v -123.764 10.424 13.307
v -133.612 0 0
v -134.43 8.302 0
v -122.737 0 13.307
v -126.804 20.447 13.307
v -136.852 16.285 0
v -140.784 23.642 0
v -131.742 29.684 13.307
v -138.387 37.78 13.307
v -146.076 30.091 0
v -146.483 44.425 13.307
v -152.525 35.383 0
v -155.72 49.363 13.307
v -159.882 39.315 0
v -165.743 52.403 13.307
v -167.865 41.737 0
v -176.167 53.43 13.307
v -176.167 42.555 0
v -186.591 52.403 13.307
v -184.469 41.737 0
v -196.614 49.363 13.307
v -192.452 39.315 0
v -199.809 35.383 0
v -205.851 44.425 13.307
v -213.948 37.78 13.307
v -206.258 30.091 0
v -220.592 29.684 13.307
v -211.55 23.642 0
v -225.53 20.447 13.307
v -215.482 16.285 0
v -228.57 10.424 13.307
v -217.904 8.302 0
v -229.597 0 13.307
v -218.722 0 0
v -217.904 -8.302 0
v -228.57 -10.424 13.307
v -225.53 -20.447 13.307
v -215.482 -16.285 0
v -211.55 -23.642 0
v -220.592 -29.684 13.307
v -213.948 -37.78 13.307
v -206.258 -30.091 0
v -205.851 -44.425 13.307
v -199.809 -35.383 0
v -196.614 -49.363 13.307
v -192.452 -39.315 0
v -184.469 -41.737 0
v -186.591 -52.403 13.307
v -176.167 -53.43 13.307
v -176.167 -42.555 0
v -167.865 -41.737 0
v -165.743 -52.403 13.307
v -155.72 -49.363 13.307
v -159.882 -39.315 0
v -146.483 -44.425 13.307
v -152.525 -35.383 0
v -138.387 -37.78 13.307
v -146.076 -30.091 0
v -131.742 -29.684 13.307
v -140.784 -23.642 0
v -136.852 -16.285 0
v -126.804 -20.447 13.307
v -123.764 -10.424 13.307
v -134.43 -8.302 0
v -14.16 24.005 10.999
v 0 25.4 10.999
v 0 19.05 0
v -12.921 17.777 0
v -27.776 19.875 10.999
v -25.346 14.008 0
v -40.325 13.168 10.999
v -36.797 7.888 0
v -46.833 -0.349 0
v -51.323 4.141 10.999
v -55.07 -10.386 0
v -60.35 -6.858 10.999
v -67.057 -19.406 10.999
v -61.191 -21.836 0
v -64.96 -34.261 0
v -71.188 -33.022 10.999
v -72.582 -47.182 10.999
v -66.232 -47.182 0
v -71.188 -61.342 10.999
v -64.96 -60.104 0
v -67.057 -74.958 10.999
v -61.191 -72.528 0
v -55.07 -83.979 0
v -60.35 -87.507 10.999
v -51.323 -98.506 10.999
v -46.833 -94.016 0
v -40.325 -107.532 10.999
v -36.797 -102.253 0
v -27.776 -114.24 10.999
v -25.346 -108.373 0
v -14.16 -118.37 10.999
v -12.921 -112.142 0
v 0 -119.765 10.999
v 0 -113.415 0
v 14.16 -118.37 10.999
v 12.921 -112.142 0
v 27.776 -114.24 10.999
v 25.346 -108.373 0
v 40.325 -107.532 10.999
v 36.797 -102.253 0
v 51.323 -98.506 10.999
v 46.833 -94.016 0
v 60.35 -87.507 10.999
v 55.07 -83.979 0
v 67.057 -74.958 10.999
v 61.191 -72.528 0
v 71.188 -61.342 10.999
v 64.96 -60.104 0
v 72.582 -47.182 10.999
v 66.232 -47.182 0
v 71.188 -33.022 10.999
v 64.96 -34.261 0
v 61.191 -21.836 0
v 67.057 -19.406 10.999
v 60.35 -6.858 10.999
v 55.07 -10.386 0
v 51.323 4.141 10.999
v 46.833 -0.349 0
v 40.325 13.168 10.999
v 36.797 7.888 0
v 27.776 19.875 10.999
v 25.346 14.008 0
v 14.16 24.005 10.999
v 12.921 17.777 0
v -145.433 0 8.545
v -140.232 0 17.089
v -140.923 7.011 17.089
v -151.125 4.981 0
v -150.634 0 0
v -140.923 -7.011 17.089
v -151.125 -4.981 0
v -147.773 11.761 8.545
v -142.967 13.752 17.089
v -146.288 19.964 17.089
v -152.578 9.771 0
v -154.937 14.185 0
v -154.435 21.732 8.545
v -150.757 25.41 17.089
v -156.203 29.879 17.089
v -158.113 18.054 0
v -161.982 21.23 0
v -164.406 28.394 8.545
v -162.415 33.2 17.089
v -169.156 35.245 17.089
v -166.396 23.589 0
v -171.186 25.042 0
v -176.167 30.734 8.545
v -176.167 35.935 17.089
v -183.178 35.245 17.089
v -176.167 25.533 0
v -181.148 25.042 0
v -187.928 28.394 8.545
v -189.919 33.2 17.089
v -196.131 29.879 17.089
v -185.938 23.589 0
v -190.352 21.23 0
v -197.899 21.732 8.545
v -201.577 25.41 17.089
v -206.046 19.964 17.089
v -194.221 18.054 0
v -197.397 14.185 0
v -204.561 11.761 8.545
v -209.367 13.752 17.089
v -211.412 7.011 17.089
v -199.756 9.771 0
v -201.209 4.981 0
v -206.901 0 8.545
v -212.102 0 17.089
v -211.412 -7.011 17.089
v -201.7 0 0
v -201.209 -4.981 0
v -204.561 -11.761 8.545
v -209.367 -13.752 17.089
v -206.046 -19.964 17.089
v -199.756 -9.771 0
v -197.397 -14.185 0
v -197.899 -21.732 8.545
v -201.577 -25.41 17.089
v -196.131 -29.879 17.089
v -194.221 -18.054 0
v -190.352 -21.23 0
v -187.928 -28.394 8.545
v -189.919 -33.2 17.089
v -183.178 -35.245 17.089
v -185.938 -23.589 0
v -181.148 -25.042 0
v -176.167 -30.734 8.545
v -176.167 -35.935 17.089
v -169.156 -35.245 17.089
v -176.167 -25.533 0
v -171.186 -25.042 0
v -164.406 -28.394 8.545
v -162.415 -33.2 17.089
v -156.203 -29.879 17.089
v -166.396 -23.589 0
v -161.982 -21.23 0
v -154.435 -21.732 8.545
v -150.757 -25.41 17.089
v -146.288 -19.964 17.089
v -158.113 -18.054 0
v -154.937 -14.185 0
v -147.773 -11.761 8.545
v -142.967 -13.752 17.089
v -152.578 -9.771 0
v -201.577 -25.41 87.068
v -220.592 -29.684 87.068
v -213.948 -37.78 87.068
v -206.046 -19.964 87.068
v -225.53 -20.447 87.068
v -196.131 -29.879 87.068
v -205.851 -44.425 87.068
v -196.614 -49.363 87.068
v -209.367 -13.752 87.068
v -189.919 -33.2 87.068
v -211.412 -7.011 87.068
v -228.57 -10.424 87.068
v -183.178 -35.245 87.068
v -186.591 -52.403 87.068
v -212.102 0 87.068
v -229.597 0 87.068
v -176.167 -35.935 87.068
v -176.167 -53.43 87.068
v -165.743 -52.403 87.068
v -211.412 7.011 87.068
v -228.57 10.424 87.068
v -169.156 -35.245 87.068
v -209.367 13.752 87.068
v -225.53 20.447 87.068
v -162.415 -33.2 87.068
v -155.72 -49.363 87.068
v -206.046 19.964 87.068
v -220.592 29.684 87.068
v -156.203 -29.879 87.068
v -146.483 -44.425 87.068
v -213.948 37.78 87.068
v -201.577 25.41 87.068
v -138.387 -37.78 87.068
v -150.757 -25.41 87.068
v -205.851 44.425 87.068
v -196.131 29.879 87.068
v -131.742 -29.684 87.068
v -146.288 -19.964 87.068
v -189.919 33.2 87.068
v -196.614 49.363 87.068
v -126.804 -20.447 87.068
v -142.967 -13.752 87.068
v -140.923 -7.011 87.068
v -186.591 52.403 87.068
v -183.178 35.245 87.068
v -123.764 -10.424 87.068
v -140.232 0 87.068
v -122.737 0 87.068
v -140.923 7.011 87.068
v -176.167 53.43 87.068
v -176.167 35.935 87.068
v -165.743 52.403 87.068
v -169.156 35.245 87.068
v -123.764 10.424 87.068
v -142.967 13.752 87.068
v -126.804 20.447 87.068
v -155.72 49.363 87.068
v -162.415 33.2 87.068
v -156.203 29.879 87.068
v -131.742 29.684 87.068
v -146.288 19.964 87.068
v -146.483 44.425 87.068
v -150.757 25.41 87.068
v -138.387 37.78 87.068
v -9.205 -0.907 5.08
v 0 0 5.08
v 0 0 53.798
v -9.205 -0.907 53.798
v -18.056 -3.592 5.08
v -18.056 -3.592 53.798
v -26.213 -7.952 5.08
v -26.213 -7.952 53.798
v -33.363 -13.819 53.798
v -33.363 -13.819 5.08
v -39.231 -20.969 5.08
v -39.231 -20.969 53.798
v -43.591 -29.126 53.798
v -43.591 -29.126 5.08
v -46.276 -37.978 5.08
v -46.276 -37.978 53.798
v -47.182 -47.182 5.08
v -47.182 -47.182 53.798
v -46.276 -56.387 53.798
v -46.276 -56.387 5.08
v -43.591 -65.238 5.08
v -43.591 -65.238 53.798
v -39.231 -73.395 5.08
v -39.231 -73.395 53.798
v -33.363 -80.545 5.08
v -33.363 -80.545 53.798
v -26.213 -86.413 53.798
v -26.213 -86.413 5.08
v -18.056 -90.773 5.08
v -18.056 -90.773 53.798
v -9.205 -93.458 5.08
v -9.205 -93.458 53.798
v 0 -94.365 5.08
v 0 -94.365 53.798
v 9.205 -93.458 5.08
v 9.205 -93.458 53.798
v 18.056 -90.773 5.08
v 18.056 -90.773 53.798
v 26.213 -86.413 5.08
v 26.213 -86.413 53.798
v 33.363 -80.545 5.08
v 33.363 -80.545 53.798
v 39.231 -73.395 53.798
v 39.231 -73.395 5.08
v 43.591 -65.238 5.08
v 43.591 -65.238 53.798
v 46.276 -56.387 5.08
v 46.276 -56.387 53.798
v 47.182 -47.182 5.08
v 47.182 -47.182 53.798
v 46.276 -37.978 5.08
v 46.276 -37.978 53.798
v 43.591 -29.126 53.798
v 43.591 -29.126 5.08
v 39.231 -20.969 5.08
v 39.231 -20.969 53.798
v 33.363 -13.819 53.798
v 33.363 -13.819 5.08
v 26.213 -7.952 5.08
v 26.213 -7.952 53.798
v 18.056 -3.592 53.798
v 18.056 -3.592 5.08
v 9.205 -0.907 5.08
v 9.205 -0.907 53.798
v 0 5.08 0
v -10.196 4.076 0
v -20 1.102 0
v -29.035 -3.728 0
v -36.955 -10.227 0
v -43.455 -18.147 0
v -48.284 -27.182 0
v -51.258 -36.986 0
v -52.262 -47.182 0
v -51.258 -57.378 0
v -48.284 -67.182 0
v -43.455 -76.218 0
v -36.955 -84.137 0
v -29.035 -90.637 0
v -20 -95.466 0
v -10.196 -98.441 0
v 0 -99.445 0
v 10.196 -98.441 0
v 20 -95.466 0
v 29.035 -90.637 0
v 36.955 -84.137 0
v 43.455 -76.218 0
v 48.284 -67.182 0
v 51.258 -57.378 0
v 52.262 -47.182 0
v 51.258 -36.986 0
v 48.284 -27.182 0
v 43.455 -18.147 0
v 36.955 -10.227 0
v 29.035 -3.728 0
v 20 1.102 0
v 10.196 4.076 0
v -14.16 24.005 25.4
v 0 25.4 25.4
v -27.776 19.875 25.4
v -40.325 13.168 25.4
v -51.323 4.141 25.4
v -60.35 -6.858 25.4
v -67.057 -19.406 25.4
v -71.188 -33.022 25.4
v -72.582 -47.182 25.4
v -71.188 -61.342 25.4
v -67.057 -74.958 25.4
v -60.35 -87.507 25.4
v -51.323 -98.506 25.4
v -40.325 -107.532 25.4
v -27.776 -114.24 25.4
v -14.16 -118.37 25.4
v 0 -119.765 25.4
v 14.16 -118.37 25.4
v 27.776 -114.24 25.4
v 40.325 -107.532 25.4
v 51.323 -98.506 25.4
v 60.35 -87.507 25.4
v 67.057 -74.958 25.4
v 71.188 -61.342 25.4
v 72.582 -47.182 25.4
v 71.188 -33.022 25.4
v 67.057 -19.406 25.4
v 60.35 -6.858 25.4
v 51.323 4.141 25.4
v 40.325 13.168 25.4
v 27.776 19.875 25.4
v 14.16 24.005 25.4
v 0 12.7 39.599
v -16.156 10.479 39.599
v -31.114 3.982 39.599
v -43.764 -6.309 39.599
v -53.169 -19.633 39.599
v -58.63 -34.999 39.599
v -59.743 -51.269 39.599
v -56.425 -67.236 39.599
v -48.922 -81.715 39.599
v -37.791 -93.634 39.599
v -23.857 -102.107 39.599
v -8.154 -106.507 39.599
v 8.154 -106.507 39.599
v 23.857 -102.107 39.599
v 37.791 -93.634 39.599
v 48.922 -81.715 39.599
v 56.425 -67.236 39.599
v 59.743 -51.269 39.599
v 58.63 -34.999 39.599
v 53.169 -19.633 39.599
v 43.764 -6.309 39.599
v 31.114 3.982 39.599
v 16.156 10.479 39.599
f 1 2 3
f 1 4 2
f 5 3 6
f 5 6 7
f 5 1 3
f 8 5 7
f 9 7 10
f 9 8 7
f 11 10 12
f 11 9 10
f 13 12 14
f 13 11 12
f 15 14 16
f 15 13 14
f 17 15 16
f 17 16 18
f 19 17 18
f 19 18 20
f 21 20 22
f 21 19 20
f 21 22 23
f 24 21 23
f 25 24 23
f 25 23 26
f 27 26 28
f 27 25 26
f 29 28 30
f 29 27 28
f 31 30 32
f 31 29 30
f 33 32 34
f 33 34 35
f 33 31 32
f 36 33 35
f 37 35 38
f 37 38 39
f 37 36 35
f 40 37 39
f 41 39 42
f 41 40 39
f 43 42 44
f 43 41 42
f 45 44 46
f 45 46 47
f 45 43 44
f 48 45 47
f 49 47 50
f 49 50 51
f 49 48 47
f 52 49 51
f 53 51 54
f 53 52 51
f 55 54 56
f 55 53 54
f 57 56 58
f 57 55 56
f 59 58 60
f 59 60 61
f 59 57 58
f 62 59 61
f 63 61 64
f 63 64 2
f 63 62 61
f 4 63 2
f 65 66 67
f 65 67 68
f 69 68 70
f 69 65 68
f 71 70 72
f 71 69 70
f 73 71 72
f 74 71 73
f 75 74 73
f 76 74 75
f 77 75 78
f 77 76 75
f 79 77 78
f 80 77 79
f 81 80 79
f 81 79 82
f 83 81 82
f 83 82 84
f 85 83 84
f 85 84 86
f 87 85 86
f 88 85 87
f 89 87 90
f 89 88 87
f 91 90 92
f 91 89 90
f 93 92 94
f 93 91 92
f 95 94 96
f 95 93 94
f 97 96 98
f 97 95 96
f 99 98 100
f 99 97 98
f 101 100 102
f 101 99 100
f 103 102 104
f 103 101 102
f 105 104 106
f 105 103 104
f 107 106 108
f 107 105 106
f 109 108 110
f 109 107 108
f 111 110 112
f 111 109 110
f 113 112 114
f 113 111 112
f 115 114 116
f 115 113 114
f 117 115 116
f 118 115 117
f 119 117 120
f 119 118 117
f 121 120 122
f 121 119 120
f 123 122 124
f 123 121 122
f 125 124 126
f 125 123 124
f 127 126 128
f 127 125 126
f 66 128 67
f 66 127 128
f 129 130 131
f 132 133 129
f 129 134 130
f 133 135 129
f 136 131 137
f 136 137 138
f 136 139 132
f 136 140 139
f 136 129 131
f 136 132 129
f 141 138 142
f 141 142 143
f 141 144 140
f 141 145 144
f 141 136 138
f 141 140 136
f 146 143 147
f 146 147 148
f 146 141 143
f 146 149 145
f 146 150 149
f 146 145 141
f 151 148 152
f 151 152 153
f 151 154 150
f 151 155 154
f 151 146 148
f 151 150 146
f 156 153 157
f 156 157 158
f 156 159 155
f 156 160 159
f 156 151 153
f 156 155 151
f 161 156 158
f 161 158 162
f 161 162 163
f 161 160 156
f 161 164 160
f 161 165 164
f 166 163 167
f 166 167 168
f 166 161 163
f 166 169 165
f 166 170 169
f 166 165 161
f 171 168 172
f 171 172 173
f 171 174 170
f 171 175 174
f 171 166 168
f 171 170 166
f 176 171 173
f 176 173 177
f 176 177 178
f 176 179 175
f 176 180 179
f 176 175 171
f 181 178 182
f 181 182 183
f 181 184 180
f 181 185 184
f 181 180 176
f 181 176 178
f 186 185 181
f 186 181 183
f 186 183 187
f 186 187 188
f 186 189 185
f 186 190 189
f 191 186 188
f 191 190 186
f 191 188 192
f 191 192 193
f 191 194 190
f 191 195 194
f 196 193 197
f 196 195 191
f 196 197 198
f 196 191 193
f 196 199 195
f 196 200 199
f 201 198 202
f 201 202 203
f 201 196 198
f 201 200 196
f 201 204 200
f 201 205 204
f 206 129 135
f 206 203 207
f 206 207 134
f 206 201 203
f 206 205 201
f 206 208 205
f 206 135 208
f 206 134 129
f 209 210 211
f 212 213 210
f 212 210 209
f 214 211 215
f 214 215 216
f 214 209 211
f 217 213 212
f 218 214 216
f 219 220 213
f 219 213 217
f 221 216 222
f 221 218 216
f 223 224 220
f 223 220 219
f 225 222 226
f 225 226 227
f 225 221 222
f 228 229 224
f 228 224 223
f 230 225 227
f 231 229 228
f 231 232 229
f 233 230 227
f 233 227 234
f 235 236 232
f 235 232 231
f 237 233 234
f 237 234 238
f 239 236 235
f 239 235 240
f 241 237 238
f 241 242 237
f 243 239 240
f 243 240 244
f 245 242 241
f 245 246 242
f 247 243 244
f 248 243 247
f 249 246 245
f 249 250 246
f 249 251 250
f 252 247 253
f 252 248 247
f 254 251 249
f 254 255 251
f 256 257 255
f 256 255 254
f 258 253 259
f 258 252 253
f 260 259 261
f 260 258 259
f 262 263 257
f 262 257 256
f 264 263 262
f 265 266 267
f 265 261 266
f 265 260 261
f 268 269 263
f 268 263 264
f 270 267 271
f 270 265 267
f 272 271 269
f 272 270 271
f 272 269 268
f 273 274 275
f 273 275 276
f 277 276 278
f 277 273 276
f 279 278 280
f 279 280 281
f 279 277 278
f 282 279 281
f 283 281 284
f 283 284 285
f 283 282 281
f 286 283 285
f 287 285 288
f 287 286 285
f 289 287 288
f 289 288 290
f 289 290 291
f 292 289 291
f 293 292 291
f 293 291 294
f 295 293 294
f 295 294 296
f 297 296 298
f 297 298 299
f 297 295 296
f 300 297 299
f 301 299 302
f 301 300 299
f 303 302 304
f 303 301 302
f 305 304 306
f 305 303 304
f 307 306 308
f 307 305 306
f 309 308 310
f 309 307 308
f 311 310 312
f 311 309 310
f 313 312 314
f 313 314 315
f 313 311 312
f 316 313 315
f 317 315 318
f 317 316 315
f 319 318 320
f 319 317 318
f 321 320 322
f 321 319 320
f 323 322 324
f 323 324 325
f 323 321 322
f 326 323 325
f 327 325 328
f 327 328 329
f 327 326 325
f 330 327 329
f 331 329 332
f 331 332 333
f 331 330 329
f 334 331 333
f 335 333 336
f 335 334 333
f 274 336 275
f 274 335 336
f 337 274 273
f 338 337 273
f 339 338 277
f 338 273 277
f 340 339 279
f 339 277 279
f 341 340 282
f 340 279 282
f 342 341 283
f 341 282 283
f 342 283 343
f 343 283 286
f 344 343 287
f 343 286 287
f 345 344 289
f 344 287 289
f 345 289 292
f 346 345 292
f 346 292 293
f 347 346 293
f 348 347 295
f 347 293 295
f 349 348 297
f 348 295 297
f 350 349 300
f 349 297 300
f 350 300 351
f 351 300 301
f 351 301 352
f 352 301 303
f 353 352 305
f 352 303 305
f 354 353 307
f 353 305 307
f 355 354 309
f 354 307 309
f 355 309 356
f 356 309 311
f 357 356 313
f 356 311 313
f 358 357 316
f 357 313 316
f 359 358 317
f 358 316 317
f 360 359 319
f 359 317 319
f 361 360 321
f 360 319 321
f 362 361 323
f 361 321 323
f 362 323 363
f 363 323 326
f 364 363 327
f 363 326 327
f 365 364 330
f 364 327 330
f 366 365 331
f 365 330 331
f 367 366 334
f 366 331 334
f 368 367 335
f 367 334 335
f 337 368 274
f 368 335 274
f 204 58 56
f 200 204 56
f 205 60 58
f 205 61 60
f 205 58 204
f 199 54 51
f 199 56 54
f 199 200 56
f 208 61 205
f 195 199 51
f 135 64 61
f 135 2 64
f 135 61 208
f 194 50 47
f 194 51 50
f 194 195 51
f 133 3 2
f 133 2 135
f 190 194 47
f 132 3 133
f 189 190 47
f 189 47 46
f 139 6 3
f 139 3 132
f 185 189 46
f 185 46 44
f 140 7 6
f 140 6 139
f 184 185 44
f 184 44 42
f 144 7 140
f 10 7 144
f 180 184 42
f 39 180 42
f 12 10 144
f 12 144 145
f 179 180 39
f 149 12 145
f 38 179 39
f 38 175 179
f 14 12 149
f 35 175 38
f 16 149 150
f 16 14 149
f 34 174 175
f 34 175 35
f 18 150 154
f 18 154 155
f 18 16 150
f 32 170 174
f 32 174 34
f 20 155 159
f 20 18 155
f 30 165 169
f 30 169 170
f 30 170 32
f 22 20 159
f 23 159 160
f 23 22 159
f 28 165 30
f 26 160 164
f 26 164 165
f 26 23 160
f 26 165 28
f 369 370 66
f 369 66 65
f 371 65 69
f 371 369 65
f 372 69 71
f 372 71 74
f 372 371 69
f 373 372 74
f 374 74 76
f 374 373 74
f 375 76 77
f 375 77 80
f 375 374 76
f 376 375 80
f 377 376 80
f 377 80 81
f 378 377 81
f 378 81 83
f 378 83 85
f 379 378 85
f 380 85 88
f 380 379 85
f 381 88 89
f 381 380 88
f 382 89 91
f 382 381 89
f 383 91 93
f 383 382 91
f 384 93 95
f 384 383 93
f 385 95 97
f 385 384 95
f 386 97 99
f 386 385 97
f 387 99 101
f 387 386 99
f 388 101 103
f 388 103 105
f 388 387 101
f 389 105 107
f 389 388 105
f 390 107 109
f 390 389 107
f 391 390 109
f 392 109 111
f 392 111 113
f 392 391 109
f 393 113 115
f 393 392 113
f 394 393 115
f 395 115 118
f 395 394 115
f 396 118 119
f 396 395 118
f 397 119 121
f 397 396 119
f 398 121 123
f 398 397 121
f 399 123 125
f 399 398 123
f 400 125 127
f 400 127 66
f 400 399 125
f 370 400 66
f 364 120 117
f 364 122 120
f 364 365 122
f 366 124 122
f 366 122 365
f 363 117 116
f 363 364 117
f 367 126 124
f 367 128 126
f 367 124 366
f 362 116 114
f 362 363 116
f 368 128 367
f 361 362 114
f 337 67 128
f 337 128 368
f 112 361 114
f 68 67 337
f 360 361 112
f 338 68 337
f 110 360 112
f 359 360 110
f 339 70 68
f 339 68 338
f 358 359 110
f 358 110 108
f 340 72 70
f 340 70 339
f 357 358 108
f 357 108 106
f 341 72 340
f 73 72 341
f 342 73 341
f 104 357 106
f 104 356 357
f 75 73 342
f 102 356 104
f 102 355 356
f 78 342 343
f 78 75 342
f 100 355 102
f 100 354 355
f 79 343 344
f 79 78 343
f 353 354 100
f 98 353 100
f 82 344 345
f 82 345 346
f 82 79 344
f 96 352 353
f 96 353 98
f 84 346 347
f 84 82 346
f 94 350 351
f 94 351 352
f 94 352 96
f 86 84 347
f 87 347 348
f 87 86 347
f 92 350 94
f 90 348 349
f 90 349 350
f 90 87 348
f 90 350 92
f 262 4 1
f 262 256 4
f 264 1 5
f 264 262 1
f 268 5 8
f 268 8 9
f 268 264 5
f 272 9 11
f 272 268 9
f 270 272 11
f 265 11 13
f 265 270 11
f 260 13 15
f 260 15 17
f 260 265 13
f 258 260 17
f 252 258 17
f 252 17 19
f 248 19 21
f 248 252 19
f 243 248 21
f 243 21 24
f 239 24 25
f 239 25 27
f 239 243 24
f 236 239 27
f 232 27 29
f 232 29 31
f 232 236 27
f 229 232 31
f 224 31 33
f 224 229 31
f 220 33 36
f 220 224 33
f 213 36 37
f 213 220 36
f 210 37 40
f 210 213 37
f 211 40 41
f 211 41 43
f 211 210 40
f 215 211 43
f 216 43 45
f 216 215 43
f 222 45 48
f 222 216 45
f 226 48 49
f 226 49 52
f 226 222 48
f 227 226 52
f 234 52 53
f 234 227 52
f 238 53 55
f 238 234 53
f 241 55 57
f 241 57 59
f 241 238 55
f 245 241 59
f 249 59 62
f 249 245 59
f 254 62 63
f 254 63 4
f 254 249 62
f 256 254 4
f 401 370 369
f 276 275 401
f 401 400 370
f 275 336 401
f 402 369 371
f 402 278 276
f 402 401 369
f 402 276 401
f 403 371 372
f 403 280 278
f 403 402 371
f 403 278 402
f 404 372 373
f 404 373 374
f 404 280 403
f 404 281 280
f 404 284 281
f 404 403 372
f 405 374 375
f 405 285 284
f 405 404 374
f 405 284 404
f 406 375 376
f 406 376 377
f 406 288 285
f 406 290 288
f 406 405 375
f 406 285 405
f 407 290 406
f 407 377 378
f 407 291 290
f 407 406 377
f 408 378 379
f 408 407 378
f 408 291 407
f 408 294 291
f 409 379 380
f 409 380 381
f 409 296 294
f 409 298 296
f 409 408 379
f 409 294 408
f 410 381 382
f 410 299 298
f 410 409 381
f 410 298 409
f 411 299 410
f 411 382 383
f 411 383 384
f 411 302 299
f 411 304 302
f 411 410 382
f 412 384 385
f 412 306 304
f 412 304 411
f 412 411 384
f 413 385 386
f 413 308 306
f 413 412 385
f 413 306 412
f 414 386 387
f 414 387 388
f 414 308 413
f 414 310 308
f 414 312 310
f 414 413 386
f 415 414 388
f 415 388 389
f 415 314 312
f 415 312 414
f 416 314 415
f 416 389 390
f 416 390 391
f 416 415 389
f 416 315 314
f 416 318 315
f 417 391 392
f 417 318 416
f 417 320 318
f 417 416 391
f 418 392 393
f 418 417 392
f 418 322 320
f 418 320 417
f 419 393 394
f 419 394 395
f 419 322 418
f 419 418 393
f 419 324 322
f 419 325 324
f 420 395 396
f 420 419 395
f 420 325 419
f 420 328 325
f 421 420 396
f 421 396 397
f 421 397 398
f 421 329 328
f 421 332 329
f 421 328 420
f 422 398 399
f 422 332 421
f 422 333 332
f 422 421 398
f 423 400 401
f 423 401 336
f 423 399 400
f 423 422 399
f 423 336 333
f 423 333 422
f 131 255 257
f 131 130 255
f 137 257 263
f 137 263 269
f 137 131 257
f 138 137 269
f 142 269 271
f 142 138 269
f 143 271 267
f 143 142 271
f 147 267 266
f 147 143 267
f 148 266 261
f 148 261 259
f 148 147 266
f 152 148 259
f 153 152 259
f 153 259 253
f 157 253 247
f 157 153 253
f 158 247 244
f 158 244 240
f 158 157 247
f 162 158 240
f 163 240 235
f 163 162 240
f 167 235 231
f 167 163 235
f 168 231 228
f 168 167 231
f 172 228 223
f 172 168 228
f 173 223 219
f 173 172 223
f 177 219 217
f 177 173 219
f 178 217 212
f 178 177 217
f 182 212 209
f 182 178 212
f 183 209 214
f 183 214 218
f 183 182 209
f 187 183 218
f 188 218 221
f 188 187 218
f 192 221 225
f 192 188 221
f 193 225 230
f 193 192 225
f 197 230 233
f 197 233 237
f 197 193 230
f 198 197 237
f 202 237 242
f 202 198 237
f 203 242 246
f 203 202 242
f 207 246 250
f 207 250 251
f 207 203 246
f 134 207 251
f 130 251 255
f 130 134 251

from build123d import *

# Parameters (mm, degrees)
F5_SIZE2 = 10.9985226281
F5_SIZE  = 6.35
F6_SIZE2 = 5.08
F6_SIZE  = 5.08


with BuildPart() as f4:
    # F3 (on Right) → F4 (revolve)
    with BuildSketch(Plane.YZ):
        Polygon((0, 25.4), (0, 0), (25.4, 0), (25.4, 25.4), (0, 53.7980633142), align=None)
    revolve(axis=Axis((0, -47.1823625267, 43.7326766551), (0, 0, 1)))

    # F5
    f5_edges = [f4.edges().sort_by_distance(p)[0] for p in [
        (0, -119.764725, 0),
    ]]
    chamfer(f5_edges, length=F5_SIZE, length2=F5_SIZE2)

    # F6
    f6_edges = [f4.edges().sort_by_distance(p)[0] for p in [
        (0, -94.364725, 0),
    ]]
    chamfer(f6_edges, length=F6_SIZE, length2=F6_SIZE2)


with BuildPart() as f8:
    # F7 (on Front) → F8 (revolve)
    with BuildSketch(Plane.XZ):
        Polygon((-140.2320563793, 17.0893389732), (-150.6342887878, 0), (-133.6124539375, 0), (-122.7373853326, 13.3067052811), (-122.7373853326, 87.068028748), (-140.2320563793, 87.068028748), align=None)
    revolve(axis=Axis((-176.1670559645, 0, 51.8085211515), (0, 0, 1)))


solid = Compound([f4.part, f8.part])
